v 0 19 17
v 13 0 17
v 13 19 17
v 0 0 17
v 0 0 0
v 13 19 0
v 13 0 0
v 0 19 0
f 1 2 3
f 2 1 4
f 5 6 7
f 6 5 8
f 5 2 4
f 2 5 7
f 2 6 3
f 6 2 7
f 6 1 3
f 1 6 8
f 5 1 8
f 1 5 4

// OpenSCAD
// Generated by SolidPython 1.0.1 on 2020-07-29 00:46:55


cube(size = [13, 19, 17]);
/***********************************************
*********      SolidPython code:      **********
************************************************
 
# import packages: SolidPython
from solid import *
from solid.utils import *
from itertools import chain, combinations, permutations


class Resize:

    def __init__(self, scad_file):
        self.scad_file = scad_file
        #self.scad_file = import_scad(scad_file)
        # cone/cylinder param:
        self.r1 = 0
        self.r2 = 0
        self.h = 0
        # rectangular prism param:
        self.w = 0
        self.l = 0
        # ellipse param:
        self.r = 0

    # import OpenScad code (file name corresponds to shape)


    # classify shape + parameters
    def assign(self, param1, param2, param3):
        if self.scad_file == 'cone.scad':
            self.r1 = param1
            self.r2 = param2
            self.h = param3
        elif self.scad_file == 'cylinder.scad':
            self.r1 = param1
            self.r2 = param2
            self.h = param3
        elif self.scad_file == 'rectangularPrism.scad':
            self.h = param1
            self.l = param2
            self.w = param3
        else:
            self.r = param1
            self.h = param2

    # resize parameters
    def iterate(self):
        x = range(3, 20, 2)
        i = 1
        if self.scad_file == 'cone.scad':
            tempList = list(permutations(x, 2))
            for temp in tempList:
                param1 = temp[0]
                param2 = temp[1]
                filepath = 'produced_scad_files/' + 'cone' + str(param1) + '_' + str(param2) + '_' + '.scad'
                scad_render_to_file(cylinder(h=param1, r1=param2, r2=0), filepath)

        elif self.scad_file == 'cylinder.scad':
            tempList = list(permutations(x, 3))
            for temp in tempList:
                param1 = temp[0]
                param2 = temp[1]
                filepath = 'produced_scad_files/' + 'cylinder' + str(param1) + '_' + str(param2) + '_' + '.scad'
                scad_render_to_file(cylinder(h=param1, r1=param2, r2=param2), filepath)

        elif self.scad_file == 'rectangularPrism.scad':
            tempList = list(permutations(x, 3))
            for temp in tempList:
                param1 = temp[0]
                param2 = temp[1]
                param3 = temp[2]
                filepath = 'produced_scad_files/' + 'rectangularPrism' + str(param1) + '_' + str(param2) + '_' + str(
                    param3) + '.scad'
                scad_render_to_file(cube(size=(param1, param2, param3)), filepath)

        elif self.scad_file == 'ellipse.scad':
            tempList = list(permutations(x, 4))
            for temp in tempList:
                param1 = temp[0]
                param2 = temp[1]
                param3 = temp[2]
                param4 = temp[3]
                filepath = 'produced_scad_files/' + 'ellipse' + str(param1) + '_' + str(param2) + '_' + str(param3) + '_' + str(param4) + '.scad'
                scad_render_to_file(scale([param1, param2, param3])(sphere(r=param4)), filepath)

    def render_to_scadfile(self):
        scad_render_to_file(scad, 'example.scad') 
 
************************************************/
